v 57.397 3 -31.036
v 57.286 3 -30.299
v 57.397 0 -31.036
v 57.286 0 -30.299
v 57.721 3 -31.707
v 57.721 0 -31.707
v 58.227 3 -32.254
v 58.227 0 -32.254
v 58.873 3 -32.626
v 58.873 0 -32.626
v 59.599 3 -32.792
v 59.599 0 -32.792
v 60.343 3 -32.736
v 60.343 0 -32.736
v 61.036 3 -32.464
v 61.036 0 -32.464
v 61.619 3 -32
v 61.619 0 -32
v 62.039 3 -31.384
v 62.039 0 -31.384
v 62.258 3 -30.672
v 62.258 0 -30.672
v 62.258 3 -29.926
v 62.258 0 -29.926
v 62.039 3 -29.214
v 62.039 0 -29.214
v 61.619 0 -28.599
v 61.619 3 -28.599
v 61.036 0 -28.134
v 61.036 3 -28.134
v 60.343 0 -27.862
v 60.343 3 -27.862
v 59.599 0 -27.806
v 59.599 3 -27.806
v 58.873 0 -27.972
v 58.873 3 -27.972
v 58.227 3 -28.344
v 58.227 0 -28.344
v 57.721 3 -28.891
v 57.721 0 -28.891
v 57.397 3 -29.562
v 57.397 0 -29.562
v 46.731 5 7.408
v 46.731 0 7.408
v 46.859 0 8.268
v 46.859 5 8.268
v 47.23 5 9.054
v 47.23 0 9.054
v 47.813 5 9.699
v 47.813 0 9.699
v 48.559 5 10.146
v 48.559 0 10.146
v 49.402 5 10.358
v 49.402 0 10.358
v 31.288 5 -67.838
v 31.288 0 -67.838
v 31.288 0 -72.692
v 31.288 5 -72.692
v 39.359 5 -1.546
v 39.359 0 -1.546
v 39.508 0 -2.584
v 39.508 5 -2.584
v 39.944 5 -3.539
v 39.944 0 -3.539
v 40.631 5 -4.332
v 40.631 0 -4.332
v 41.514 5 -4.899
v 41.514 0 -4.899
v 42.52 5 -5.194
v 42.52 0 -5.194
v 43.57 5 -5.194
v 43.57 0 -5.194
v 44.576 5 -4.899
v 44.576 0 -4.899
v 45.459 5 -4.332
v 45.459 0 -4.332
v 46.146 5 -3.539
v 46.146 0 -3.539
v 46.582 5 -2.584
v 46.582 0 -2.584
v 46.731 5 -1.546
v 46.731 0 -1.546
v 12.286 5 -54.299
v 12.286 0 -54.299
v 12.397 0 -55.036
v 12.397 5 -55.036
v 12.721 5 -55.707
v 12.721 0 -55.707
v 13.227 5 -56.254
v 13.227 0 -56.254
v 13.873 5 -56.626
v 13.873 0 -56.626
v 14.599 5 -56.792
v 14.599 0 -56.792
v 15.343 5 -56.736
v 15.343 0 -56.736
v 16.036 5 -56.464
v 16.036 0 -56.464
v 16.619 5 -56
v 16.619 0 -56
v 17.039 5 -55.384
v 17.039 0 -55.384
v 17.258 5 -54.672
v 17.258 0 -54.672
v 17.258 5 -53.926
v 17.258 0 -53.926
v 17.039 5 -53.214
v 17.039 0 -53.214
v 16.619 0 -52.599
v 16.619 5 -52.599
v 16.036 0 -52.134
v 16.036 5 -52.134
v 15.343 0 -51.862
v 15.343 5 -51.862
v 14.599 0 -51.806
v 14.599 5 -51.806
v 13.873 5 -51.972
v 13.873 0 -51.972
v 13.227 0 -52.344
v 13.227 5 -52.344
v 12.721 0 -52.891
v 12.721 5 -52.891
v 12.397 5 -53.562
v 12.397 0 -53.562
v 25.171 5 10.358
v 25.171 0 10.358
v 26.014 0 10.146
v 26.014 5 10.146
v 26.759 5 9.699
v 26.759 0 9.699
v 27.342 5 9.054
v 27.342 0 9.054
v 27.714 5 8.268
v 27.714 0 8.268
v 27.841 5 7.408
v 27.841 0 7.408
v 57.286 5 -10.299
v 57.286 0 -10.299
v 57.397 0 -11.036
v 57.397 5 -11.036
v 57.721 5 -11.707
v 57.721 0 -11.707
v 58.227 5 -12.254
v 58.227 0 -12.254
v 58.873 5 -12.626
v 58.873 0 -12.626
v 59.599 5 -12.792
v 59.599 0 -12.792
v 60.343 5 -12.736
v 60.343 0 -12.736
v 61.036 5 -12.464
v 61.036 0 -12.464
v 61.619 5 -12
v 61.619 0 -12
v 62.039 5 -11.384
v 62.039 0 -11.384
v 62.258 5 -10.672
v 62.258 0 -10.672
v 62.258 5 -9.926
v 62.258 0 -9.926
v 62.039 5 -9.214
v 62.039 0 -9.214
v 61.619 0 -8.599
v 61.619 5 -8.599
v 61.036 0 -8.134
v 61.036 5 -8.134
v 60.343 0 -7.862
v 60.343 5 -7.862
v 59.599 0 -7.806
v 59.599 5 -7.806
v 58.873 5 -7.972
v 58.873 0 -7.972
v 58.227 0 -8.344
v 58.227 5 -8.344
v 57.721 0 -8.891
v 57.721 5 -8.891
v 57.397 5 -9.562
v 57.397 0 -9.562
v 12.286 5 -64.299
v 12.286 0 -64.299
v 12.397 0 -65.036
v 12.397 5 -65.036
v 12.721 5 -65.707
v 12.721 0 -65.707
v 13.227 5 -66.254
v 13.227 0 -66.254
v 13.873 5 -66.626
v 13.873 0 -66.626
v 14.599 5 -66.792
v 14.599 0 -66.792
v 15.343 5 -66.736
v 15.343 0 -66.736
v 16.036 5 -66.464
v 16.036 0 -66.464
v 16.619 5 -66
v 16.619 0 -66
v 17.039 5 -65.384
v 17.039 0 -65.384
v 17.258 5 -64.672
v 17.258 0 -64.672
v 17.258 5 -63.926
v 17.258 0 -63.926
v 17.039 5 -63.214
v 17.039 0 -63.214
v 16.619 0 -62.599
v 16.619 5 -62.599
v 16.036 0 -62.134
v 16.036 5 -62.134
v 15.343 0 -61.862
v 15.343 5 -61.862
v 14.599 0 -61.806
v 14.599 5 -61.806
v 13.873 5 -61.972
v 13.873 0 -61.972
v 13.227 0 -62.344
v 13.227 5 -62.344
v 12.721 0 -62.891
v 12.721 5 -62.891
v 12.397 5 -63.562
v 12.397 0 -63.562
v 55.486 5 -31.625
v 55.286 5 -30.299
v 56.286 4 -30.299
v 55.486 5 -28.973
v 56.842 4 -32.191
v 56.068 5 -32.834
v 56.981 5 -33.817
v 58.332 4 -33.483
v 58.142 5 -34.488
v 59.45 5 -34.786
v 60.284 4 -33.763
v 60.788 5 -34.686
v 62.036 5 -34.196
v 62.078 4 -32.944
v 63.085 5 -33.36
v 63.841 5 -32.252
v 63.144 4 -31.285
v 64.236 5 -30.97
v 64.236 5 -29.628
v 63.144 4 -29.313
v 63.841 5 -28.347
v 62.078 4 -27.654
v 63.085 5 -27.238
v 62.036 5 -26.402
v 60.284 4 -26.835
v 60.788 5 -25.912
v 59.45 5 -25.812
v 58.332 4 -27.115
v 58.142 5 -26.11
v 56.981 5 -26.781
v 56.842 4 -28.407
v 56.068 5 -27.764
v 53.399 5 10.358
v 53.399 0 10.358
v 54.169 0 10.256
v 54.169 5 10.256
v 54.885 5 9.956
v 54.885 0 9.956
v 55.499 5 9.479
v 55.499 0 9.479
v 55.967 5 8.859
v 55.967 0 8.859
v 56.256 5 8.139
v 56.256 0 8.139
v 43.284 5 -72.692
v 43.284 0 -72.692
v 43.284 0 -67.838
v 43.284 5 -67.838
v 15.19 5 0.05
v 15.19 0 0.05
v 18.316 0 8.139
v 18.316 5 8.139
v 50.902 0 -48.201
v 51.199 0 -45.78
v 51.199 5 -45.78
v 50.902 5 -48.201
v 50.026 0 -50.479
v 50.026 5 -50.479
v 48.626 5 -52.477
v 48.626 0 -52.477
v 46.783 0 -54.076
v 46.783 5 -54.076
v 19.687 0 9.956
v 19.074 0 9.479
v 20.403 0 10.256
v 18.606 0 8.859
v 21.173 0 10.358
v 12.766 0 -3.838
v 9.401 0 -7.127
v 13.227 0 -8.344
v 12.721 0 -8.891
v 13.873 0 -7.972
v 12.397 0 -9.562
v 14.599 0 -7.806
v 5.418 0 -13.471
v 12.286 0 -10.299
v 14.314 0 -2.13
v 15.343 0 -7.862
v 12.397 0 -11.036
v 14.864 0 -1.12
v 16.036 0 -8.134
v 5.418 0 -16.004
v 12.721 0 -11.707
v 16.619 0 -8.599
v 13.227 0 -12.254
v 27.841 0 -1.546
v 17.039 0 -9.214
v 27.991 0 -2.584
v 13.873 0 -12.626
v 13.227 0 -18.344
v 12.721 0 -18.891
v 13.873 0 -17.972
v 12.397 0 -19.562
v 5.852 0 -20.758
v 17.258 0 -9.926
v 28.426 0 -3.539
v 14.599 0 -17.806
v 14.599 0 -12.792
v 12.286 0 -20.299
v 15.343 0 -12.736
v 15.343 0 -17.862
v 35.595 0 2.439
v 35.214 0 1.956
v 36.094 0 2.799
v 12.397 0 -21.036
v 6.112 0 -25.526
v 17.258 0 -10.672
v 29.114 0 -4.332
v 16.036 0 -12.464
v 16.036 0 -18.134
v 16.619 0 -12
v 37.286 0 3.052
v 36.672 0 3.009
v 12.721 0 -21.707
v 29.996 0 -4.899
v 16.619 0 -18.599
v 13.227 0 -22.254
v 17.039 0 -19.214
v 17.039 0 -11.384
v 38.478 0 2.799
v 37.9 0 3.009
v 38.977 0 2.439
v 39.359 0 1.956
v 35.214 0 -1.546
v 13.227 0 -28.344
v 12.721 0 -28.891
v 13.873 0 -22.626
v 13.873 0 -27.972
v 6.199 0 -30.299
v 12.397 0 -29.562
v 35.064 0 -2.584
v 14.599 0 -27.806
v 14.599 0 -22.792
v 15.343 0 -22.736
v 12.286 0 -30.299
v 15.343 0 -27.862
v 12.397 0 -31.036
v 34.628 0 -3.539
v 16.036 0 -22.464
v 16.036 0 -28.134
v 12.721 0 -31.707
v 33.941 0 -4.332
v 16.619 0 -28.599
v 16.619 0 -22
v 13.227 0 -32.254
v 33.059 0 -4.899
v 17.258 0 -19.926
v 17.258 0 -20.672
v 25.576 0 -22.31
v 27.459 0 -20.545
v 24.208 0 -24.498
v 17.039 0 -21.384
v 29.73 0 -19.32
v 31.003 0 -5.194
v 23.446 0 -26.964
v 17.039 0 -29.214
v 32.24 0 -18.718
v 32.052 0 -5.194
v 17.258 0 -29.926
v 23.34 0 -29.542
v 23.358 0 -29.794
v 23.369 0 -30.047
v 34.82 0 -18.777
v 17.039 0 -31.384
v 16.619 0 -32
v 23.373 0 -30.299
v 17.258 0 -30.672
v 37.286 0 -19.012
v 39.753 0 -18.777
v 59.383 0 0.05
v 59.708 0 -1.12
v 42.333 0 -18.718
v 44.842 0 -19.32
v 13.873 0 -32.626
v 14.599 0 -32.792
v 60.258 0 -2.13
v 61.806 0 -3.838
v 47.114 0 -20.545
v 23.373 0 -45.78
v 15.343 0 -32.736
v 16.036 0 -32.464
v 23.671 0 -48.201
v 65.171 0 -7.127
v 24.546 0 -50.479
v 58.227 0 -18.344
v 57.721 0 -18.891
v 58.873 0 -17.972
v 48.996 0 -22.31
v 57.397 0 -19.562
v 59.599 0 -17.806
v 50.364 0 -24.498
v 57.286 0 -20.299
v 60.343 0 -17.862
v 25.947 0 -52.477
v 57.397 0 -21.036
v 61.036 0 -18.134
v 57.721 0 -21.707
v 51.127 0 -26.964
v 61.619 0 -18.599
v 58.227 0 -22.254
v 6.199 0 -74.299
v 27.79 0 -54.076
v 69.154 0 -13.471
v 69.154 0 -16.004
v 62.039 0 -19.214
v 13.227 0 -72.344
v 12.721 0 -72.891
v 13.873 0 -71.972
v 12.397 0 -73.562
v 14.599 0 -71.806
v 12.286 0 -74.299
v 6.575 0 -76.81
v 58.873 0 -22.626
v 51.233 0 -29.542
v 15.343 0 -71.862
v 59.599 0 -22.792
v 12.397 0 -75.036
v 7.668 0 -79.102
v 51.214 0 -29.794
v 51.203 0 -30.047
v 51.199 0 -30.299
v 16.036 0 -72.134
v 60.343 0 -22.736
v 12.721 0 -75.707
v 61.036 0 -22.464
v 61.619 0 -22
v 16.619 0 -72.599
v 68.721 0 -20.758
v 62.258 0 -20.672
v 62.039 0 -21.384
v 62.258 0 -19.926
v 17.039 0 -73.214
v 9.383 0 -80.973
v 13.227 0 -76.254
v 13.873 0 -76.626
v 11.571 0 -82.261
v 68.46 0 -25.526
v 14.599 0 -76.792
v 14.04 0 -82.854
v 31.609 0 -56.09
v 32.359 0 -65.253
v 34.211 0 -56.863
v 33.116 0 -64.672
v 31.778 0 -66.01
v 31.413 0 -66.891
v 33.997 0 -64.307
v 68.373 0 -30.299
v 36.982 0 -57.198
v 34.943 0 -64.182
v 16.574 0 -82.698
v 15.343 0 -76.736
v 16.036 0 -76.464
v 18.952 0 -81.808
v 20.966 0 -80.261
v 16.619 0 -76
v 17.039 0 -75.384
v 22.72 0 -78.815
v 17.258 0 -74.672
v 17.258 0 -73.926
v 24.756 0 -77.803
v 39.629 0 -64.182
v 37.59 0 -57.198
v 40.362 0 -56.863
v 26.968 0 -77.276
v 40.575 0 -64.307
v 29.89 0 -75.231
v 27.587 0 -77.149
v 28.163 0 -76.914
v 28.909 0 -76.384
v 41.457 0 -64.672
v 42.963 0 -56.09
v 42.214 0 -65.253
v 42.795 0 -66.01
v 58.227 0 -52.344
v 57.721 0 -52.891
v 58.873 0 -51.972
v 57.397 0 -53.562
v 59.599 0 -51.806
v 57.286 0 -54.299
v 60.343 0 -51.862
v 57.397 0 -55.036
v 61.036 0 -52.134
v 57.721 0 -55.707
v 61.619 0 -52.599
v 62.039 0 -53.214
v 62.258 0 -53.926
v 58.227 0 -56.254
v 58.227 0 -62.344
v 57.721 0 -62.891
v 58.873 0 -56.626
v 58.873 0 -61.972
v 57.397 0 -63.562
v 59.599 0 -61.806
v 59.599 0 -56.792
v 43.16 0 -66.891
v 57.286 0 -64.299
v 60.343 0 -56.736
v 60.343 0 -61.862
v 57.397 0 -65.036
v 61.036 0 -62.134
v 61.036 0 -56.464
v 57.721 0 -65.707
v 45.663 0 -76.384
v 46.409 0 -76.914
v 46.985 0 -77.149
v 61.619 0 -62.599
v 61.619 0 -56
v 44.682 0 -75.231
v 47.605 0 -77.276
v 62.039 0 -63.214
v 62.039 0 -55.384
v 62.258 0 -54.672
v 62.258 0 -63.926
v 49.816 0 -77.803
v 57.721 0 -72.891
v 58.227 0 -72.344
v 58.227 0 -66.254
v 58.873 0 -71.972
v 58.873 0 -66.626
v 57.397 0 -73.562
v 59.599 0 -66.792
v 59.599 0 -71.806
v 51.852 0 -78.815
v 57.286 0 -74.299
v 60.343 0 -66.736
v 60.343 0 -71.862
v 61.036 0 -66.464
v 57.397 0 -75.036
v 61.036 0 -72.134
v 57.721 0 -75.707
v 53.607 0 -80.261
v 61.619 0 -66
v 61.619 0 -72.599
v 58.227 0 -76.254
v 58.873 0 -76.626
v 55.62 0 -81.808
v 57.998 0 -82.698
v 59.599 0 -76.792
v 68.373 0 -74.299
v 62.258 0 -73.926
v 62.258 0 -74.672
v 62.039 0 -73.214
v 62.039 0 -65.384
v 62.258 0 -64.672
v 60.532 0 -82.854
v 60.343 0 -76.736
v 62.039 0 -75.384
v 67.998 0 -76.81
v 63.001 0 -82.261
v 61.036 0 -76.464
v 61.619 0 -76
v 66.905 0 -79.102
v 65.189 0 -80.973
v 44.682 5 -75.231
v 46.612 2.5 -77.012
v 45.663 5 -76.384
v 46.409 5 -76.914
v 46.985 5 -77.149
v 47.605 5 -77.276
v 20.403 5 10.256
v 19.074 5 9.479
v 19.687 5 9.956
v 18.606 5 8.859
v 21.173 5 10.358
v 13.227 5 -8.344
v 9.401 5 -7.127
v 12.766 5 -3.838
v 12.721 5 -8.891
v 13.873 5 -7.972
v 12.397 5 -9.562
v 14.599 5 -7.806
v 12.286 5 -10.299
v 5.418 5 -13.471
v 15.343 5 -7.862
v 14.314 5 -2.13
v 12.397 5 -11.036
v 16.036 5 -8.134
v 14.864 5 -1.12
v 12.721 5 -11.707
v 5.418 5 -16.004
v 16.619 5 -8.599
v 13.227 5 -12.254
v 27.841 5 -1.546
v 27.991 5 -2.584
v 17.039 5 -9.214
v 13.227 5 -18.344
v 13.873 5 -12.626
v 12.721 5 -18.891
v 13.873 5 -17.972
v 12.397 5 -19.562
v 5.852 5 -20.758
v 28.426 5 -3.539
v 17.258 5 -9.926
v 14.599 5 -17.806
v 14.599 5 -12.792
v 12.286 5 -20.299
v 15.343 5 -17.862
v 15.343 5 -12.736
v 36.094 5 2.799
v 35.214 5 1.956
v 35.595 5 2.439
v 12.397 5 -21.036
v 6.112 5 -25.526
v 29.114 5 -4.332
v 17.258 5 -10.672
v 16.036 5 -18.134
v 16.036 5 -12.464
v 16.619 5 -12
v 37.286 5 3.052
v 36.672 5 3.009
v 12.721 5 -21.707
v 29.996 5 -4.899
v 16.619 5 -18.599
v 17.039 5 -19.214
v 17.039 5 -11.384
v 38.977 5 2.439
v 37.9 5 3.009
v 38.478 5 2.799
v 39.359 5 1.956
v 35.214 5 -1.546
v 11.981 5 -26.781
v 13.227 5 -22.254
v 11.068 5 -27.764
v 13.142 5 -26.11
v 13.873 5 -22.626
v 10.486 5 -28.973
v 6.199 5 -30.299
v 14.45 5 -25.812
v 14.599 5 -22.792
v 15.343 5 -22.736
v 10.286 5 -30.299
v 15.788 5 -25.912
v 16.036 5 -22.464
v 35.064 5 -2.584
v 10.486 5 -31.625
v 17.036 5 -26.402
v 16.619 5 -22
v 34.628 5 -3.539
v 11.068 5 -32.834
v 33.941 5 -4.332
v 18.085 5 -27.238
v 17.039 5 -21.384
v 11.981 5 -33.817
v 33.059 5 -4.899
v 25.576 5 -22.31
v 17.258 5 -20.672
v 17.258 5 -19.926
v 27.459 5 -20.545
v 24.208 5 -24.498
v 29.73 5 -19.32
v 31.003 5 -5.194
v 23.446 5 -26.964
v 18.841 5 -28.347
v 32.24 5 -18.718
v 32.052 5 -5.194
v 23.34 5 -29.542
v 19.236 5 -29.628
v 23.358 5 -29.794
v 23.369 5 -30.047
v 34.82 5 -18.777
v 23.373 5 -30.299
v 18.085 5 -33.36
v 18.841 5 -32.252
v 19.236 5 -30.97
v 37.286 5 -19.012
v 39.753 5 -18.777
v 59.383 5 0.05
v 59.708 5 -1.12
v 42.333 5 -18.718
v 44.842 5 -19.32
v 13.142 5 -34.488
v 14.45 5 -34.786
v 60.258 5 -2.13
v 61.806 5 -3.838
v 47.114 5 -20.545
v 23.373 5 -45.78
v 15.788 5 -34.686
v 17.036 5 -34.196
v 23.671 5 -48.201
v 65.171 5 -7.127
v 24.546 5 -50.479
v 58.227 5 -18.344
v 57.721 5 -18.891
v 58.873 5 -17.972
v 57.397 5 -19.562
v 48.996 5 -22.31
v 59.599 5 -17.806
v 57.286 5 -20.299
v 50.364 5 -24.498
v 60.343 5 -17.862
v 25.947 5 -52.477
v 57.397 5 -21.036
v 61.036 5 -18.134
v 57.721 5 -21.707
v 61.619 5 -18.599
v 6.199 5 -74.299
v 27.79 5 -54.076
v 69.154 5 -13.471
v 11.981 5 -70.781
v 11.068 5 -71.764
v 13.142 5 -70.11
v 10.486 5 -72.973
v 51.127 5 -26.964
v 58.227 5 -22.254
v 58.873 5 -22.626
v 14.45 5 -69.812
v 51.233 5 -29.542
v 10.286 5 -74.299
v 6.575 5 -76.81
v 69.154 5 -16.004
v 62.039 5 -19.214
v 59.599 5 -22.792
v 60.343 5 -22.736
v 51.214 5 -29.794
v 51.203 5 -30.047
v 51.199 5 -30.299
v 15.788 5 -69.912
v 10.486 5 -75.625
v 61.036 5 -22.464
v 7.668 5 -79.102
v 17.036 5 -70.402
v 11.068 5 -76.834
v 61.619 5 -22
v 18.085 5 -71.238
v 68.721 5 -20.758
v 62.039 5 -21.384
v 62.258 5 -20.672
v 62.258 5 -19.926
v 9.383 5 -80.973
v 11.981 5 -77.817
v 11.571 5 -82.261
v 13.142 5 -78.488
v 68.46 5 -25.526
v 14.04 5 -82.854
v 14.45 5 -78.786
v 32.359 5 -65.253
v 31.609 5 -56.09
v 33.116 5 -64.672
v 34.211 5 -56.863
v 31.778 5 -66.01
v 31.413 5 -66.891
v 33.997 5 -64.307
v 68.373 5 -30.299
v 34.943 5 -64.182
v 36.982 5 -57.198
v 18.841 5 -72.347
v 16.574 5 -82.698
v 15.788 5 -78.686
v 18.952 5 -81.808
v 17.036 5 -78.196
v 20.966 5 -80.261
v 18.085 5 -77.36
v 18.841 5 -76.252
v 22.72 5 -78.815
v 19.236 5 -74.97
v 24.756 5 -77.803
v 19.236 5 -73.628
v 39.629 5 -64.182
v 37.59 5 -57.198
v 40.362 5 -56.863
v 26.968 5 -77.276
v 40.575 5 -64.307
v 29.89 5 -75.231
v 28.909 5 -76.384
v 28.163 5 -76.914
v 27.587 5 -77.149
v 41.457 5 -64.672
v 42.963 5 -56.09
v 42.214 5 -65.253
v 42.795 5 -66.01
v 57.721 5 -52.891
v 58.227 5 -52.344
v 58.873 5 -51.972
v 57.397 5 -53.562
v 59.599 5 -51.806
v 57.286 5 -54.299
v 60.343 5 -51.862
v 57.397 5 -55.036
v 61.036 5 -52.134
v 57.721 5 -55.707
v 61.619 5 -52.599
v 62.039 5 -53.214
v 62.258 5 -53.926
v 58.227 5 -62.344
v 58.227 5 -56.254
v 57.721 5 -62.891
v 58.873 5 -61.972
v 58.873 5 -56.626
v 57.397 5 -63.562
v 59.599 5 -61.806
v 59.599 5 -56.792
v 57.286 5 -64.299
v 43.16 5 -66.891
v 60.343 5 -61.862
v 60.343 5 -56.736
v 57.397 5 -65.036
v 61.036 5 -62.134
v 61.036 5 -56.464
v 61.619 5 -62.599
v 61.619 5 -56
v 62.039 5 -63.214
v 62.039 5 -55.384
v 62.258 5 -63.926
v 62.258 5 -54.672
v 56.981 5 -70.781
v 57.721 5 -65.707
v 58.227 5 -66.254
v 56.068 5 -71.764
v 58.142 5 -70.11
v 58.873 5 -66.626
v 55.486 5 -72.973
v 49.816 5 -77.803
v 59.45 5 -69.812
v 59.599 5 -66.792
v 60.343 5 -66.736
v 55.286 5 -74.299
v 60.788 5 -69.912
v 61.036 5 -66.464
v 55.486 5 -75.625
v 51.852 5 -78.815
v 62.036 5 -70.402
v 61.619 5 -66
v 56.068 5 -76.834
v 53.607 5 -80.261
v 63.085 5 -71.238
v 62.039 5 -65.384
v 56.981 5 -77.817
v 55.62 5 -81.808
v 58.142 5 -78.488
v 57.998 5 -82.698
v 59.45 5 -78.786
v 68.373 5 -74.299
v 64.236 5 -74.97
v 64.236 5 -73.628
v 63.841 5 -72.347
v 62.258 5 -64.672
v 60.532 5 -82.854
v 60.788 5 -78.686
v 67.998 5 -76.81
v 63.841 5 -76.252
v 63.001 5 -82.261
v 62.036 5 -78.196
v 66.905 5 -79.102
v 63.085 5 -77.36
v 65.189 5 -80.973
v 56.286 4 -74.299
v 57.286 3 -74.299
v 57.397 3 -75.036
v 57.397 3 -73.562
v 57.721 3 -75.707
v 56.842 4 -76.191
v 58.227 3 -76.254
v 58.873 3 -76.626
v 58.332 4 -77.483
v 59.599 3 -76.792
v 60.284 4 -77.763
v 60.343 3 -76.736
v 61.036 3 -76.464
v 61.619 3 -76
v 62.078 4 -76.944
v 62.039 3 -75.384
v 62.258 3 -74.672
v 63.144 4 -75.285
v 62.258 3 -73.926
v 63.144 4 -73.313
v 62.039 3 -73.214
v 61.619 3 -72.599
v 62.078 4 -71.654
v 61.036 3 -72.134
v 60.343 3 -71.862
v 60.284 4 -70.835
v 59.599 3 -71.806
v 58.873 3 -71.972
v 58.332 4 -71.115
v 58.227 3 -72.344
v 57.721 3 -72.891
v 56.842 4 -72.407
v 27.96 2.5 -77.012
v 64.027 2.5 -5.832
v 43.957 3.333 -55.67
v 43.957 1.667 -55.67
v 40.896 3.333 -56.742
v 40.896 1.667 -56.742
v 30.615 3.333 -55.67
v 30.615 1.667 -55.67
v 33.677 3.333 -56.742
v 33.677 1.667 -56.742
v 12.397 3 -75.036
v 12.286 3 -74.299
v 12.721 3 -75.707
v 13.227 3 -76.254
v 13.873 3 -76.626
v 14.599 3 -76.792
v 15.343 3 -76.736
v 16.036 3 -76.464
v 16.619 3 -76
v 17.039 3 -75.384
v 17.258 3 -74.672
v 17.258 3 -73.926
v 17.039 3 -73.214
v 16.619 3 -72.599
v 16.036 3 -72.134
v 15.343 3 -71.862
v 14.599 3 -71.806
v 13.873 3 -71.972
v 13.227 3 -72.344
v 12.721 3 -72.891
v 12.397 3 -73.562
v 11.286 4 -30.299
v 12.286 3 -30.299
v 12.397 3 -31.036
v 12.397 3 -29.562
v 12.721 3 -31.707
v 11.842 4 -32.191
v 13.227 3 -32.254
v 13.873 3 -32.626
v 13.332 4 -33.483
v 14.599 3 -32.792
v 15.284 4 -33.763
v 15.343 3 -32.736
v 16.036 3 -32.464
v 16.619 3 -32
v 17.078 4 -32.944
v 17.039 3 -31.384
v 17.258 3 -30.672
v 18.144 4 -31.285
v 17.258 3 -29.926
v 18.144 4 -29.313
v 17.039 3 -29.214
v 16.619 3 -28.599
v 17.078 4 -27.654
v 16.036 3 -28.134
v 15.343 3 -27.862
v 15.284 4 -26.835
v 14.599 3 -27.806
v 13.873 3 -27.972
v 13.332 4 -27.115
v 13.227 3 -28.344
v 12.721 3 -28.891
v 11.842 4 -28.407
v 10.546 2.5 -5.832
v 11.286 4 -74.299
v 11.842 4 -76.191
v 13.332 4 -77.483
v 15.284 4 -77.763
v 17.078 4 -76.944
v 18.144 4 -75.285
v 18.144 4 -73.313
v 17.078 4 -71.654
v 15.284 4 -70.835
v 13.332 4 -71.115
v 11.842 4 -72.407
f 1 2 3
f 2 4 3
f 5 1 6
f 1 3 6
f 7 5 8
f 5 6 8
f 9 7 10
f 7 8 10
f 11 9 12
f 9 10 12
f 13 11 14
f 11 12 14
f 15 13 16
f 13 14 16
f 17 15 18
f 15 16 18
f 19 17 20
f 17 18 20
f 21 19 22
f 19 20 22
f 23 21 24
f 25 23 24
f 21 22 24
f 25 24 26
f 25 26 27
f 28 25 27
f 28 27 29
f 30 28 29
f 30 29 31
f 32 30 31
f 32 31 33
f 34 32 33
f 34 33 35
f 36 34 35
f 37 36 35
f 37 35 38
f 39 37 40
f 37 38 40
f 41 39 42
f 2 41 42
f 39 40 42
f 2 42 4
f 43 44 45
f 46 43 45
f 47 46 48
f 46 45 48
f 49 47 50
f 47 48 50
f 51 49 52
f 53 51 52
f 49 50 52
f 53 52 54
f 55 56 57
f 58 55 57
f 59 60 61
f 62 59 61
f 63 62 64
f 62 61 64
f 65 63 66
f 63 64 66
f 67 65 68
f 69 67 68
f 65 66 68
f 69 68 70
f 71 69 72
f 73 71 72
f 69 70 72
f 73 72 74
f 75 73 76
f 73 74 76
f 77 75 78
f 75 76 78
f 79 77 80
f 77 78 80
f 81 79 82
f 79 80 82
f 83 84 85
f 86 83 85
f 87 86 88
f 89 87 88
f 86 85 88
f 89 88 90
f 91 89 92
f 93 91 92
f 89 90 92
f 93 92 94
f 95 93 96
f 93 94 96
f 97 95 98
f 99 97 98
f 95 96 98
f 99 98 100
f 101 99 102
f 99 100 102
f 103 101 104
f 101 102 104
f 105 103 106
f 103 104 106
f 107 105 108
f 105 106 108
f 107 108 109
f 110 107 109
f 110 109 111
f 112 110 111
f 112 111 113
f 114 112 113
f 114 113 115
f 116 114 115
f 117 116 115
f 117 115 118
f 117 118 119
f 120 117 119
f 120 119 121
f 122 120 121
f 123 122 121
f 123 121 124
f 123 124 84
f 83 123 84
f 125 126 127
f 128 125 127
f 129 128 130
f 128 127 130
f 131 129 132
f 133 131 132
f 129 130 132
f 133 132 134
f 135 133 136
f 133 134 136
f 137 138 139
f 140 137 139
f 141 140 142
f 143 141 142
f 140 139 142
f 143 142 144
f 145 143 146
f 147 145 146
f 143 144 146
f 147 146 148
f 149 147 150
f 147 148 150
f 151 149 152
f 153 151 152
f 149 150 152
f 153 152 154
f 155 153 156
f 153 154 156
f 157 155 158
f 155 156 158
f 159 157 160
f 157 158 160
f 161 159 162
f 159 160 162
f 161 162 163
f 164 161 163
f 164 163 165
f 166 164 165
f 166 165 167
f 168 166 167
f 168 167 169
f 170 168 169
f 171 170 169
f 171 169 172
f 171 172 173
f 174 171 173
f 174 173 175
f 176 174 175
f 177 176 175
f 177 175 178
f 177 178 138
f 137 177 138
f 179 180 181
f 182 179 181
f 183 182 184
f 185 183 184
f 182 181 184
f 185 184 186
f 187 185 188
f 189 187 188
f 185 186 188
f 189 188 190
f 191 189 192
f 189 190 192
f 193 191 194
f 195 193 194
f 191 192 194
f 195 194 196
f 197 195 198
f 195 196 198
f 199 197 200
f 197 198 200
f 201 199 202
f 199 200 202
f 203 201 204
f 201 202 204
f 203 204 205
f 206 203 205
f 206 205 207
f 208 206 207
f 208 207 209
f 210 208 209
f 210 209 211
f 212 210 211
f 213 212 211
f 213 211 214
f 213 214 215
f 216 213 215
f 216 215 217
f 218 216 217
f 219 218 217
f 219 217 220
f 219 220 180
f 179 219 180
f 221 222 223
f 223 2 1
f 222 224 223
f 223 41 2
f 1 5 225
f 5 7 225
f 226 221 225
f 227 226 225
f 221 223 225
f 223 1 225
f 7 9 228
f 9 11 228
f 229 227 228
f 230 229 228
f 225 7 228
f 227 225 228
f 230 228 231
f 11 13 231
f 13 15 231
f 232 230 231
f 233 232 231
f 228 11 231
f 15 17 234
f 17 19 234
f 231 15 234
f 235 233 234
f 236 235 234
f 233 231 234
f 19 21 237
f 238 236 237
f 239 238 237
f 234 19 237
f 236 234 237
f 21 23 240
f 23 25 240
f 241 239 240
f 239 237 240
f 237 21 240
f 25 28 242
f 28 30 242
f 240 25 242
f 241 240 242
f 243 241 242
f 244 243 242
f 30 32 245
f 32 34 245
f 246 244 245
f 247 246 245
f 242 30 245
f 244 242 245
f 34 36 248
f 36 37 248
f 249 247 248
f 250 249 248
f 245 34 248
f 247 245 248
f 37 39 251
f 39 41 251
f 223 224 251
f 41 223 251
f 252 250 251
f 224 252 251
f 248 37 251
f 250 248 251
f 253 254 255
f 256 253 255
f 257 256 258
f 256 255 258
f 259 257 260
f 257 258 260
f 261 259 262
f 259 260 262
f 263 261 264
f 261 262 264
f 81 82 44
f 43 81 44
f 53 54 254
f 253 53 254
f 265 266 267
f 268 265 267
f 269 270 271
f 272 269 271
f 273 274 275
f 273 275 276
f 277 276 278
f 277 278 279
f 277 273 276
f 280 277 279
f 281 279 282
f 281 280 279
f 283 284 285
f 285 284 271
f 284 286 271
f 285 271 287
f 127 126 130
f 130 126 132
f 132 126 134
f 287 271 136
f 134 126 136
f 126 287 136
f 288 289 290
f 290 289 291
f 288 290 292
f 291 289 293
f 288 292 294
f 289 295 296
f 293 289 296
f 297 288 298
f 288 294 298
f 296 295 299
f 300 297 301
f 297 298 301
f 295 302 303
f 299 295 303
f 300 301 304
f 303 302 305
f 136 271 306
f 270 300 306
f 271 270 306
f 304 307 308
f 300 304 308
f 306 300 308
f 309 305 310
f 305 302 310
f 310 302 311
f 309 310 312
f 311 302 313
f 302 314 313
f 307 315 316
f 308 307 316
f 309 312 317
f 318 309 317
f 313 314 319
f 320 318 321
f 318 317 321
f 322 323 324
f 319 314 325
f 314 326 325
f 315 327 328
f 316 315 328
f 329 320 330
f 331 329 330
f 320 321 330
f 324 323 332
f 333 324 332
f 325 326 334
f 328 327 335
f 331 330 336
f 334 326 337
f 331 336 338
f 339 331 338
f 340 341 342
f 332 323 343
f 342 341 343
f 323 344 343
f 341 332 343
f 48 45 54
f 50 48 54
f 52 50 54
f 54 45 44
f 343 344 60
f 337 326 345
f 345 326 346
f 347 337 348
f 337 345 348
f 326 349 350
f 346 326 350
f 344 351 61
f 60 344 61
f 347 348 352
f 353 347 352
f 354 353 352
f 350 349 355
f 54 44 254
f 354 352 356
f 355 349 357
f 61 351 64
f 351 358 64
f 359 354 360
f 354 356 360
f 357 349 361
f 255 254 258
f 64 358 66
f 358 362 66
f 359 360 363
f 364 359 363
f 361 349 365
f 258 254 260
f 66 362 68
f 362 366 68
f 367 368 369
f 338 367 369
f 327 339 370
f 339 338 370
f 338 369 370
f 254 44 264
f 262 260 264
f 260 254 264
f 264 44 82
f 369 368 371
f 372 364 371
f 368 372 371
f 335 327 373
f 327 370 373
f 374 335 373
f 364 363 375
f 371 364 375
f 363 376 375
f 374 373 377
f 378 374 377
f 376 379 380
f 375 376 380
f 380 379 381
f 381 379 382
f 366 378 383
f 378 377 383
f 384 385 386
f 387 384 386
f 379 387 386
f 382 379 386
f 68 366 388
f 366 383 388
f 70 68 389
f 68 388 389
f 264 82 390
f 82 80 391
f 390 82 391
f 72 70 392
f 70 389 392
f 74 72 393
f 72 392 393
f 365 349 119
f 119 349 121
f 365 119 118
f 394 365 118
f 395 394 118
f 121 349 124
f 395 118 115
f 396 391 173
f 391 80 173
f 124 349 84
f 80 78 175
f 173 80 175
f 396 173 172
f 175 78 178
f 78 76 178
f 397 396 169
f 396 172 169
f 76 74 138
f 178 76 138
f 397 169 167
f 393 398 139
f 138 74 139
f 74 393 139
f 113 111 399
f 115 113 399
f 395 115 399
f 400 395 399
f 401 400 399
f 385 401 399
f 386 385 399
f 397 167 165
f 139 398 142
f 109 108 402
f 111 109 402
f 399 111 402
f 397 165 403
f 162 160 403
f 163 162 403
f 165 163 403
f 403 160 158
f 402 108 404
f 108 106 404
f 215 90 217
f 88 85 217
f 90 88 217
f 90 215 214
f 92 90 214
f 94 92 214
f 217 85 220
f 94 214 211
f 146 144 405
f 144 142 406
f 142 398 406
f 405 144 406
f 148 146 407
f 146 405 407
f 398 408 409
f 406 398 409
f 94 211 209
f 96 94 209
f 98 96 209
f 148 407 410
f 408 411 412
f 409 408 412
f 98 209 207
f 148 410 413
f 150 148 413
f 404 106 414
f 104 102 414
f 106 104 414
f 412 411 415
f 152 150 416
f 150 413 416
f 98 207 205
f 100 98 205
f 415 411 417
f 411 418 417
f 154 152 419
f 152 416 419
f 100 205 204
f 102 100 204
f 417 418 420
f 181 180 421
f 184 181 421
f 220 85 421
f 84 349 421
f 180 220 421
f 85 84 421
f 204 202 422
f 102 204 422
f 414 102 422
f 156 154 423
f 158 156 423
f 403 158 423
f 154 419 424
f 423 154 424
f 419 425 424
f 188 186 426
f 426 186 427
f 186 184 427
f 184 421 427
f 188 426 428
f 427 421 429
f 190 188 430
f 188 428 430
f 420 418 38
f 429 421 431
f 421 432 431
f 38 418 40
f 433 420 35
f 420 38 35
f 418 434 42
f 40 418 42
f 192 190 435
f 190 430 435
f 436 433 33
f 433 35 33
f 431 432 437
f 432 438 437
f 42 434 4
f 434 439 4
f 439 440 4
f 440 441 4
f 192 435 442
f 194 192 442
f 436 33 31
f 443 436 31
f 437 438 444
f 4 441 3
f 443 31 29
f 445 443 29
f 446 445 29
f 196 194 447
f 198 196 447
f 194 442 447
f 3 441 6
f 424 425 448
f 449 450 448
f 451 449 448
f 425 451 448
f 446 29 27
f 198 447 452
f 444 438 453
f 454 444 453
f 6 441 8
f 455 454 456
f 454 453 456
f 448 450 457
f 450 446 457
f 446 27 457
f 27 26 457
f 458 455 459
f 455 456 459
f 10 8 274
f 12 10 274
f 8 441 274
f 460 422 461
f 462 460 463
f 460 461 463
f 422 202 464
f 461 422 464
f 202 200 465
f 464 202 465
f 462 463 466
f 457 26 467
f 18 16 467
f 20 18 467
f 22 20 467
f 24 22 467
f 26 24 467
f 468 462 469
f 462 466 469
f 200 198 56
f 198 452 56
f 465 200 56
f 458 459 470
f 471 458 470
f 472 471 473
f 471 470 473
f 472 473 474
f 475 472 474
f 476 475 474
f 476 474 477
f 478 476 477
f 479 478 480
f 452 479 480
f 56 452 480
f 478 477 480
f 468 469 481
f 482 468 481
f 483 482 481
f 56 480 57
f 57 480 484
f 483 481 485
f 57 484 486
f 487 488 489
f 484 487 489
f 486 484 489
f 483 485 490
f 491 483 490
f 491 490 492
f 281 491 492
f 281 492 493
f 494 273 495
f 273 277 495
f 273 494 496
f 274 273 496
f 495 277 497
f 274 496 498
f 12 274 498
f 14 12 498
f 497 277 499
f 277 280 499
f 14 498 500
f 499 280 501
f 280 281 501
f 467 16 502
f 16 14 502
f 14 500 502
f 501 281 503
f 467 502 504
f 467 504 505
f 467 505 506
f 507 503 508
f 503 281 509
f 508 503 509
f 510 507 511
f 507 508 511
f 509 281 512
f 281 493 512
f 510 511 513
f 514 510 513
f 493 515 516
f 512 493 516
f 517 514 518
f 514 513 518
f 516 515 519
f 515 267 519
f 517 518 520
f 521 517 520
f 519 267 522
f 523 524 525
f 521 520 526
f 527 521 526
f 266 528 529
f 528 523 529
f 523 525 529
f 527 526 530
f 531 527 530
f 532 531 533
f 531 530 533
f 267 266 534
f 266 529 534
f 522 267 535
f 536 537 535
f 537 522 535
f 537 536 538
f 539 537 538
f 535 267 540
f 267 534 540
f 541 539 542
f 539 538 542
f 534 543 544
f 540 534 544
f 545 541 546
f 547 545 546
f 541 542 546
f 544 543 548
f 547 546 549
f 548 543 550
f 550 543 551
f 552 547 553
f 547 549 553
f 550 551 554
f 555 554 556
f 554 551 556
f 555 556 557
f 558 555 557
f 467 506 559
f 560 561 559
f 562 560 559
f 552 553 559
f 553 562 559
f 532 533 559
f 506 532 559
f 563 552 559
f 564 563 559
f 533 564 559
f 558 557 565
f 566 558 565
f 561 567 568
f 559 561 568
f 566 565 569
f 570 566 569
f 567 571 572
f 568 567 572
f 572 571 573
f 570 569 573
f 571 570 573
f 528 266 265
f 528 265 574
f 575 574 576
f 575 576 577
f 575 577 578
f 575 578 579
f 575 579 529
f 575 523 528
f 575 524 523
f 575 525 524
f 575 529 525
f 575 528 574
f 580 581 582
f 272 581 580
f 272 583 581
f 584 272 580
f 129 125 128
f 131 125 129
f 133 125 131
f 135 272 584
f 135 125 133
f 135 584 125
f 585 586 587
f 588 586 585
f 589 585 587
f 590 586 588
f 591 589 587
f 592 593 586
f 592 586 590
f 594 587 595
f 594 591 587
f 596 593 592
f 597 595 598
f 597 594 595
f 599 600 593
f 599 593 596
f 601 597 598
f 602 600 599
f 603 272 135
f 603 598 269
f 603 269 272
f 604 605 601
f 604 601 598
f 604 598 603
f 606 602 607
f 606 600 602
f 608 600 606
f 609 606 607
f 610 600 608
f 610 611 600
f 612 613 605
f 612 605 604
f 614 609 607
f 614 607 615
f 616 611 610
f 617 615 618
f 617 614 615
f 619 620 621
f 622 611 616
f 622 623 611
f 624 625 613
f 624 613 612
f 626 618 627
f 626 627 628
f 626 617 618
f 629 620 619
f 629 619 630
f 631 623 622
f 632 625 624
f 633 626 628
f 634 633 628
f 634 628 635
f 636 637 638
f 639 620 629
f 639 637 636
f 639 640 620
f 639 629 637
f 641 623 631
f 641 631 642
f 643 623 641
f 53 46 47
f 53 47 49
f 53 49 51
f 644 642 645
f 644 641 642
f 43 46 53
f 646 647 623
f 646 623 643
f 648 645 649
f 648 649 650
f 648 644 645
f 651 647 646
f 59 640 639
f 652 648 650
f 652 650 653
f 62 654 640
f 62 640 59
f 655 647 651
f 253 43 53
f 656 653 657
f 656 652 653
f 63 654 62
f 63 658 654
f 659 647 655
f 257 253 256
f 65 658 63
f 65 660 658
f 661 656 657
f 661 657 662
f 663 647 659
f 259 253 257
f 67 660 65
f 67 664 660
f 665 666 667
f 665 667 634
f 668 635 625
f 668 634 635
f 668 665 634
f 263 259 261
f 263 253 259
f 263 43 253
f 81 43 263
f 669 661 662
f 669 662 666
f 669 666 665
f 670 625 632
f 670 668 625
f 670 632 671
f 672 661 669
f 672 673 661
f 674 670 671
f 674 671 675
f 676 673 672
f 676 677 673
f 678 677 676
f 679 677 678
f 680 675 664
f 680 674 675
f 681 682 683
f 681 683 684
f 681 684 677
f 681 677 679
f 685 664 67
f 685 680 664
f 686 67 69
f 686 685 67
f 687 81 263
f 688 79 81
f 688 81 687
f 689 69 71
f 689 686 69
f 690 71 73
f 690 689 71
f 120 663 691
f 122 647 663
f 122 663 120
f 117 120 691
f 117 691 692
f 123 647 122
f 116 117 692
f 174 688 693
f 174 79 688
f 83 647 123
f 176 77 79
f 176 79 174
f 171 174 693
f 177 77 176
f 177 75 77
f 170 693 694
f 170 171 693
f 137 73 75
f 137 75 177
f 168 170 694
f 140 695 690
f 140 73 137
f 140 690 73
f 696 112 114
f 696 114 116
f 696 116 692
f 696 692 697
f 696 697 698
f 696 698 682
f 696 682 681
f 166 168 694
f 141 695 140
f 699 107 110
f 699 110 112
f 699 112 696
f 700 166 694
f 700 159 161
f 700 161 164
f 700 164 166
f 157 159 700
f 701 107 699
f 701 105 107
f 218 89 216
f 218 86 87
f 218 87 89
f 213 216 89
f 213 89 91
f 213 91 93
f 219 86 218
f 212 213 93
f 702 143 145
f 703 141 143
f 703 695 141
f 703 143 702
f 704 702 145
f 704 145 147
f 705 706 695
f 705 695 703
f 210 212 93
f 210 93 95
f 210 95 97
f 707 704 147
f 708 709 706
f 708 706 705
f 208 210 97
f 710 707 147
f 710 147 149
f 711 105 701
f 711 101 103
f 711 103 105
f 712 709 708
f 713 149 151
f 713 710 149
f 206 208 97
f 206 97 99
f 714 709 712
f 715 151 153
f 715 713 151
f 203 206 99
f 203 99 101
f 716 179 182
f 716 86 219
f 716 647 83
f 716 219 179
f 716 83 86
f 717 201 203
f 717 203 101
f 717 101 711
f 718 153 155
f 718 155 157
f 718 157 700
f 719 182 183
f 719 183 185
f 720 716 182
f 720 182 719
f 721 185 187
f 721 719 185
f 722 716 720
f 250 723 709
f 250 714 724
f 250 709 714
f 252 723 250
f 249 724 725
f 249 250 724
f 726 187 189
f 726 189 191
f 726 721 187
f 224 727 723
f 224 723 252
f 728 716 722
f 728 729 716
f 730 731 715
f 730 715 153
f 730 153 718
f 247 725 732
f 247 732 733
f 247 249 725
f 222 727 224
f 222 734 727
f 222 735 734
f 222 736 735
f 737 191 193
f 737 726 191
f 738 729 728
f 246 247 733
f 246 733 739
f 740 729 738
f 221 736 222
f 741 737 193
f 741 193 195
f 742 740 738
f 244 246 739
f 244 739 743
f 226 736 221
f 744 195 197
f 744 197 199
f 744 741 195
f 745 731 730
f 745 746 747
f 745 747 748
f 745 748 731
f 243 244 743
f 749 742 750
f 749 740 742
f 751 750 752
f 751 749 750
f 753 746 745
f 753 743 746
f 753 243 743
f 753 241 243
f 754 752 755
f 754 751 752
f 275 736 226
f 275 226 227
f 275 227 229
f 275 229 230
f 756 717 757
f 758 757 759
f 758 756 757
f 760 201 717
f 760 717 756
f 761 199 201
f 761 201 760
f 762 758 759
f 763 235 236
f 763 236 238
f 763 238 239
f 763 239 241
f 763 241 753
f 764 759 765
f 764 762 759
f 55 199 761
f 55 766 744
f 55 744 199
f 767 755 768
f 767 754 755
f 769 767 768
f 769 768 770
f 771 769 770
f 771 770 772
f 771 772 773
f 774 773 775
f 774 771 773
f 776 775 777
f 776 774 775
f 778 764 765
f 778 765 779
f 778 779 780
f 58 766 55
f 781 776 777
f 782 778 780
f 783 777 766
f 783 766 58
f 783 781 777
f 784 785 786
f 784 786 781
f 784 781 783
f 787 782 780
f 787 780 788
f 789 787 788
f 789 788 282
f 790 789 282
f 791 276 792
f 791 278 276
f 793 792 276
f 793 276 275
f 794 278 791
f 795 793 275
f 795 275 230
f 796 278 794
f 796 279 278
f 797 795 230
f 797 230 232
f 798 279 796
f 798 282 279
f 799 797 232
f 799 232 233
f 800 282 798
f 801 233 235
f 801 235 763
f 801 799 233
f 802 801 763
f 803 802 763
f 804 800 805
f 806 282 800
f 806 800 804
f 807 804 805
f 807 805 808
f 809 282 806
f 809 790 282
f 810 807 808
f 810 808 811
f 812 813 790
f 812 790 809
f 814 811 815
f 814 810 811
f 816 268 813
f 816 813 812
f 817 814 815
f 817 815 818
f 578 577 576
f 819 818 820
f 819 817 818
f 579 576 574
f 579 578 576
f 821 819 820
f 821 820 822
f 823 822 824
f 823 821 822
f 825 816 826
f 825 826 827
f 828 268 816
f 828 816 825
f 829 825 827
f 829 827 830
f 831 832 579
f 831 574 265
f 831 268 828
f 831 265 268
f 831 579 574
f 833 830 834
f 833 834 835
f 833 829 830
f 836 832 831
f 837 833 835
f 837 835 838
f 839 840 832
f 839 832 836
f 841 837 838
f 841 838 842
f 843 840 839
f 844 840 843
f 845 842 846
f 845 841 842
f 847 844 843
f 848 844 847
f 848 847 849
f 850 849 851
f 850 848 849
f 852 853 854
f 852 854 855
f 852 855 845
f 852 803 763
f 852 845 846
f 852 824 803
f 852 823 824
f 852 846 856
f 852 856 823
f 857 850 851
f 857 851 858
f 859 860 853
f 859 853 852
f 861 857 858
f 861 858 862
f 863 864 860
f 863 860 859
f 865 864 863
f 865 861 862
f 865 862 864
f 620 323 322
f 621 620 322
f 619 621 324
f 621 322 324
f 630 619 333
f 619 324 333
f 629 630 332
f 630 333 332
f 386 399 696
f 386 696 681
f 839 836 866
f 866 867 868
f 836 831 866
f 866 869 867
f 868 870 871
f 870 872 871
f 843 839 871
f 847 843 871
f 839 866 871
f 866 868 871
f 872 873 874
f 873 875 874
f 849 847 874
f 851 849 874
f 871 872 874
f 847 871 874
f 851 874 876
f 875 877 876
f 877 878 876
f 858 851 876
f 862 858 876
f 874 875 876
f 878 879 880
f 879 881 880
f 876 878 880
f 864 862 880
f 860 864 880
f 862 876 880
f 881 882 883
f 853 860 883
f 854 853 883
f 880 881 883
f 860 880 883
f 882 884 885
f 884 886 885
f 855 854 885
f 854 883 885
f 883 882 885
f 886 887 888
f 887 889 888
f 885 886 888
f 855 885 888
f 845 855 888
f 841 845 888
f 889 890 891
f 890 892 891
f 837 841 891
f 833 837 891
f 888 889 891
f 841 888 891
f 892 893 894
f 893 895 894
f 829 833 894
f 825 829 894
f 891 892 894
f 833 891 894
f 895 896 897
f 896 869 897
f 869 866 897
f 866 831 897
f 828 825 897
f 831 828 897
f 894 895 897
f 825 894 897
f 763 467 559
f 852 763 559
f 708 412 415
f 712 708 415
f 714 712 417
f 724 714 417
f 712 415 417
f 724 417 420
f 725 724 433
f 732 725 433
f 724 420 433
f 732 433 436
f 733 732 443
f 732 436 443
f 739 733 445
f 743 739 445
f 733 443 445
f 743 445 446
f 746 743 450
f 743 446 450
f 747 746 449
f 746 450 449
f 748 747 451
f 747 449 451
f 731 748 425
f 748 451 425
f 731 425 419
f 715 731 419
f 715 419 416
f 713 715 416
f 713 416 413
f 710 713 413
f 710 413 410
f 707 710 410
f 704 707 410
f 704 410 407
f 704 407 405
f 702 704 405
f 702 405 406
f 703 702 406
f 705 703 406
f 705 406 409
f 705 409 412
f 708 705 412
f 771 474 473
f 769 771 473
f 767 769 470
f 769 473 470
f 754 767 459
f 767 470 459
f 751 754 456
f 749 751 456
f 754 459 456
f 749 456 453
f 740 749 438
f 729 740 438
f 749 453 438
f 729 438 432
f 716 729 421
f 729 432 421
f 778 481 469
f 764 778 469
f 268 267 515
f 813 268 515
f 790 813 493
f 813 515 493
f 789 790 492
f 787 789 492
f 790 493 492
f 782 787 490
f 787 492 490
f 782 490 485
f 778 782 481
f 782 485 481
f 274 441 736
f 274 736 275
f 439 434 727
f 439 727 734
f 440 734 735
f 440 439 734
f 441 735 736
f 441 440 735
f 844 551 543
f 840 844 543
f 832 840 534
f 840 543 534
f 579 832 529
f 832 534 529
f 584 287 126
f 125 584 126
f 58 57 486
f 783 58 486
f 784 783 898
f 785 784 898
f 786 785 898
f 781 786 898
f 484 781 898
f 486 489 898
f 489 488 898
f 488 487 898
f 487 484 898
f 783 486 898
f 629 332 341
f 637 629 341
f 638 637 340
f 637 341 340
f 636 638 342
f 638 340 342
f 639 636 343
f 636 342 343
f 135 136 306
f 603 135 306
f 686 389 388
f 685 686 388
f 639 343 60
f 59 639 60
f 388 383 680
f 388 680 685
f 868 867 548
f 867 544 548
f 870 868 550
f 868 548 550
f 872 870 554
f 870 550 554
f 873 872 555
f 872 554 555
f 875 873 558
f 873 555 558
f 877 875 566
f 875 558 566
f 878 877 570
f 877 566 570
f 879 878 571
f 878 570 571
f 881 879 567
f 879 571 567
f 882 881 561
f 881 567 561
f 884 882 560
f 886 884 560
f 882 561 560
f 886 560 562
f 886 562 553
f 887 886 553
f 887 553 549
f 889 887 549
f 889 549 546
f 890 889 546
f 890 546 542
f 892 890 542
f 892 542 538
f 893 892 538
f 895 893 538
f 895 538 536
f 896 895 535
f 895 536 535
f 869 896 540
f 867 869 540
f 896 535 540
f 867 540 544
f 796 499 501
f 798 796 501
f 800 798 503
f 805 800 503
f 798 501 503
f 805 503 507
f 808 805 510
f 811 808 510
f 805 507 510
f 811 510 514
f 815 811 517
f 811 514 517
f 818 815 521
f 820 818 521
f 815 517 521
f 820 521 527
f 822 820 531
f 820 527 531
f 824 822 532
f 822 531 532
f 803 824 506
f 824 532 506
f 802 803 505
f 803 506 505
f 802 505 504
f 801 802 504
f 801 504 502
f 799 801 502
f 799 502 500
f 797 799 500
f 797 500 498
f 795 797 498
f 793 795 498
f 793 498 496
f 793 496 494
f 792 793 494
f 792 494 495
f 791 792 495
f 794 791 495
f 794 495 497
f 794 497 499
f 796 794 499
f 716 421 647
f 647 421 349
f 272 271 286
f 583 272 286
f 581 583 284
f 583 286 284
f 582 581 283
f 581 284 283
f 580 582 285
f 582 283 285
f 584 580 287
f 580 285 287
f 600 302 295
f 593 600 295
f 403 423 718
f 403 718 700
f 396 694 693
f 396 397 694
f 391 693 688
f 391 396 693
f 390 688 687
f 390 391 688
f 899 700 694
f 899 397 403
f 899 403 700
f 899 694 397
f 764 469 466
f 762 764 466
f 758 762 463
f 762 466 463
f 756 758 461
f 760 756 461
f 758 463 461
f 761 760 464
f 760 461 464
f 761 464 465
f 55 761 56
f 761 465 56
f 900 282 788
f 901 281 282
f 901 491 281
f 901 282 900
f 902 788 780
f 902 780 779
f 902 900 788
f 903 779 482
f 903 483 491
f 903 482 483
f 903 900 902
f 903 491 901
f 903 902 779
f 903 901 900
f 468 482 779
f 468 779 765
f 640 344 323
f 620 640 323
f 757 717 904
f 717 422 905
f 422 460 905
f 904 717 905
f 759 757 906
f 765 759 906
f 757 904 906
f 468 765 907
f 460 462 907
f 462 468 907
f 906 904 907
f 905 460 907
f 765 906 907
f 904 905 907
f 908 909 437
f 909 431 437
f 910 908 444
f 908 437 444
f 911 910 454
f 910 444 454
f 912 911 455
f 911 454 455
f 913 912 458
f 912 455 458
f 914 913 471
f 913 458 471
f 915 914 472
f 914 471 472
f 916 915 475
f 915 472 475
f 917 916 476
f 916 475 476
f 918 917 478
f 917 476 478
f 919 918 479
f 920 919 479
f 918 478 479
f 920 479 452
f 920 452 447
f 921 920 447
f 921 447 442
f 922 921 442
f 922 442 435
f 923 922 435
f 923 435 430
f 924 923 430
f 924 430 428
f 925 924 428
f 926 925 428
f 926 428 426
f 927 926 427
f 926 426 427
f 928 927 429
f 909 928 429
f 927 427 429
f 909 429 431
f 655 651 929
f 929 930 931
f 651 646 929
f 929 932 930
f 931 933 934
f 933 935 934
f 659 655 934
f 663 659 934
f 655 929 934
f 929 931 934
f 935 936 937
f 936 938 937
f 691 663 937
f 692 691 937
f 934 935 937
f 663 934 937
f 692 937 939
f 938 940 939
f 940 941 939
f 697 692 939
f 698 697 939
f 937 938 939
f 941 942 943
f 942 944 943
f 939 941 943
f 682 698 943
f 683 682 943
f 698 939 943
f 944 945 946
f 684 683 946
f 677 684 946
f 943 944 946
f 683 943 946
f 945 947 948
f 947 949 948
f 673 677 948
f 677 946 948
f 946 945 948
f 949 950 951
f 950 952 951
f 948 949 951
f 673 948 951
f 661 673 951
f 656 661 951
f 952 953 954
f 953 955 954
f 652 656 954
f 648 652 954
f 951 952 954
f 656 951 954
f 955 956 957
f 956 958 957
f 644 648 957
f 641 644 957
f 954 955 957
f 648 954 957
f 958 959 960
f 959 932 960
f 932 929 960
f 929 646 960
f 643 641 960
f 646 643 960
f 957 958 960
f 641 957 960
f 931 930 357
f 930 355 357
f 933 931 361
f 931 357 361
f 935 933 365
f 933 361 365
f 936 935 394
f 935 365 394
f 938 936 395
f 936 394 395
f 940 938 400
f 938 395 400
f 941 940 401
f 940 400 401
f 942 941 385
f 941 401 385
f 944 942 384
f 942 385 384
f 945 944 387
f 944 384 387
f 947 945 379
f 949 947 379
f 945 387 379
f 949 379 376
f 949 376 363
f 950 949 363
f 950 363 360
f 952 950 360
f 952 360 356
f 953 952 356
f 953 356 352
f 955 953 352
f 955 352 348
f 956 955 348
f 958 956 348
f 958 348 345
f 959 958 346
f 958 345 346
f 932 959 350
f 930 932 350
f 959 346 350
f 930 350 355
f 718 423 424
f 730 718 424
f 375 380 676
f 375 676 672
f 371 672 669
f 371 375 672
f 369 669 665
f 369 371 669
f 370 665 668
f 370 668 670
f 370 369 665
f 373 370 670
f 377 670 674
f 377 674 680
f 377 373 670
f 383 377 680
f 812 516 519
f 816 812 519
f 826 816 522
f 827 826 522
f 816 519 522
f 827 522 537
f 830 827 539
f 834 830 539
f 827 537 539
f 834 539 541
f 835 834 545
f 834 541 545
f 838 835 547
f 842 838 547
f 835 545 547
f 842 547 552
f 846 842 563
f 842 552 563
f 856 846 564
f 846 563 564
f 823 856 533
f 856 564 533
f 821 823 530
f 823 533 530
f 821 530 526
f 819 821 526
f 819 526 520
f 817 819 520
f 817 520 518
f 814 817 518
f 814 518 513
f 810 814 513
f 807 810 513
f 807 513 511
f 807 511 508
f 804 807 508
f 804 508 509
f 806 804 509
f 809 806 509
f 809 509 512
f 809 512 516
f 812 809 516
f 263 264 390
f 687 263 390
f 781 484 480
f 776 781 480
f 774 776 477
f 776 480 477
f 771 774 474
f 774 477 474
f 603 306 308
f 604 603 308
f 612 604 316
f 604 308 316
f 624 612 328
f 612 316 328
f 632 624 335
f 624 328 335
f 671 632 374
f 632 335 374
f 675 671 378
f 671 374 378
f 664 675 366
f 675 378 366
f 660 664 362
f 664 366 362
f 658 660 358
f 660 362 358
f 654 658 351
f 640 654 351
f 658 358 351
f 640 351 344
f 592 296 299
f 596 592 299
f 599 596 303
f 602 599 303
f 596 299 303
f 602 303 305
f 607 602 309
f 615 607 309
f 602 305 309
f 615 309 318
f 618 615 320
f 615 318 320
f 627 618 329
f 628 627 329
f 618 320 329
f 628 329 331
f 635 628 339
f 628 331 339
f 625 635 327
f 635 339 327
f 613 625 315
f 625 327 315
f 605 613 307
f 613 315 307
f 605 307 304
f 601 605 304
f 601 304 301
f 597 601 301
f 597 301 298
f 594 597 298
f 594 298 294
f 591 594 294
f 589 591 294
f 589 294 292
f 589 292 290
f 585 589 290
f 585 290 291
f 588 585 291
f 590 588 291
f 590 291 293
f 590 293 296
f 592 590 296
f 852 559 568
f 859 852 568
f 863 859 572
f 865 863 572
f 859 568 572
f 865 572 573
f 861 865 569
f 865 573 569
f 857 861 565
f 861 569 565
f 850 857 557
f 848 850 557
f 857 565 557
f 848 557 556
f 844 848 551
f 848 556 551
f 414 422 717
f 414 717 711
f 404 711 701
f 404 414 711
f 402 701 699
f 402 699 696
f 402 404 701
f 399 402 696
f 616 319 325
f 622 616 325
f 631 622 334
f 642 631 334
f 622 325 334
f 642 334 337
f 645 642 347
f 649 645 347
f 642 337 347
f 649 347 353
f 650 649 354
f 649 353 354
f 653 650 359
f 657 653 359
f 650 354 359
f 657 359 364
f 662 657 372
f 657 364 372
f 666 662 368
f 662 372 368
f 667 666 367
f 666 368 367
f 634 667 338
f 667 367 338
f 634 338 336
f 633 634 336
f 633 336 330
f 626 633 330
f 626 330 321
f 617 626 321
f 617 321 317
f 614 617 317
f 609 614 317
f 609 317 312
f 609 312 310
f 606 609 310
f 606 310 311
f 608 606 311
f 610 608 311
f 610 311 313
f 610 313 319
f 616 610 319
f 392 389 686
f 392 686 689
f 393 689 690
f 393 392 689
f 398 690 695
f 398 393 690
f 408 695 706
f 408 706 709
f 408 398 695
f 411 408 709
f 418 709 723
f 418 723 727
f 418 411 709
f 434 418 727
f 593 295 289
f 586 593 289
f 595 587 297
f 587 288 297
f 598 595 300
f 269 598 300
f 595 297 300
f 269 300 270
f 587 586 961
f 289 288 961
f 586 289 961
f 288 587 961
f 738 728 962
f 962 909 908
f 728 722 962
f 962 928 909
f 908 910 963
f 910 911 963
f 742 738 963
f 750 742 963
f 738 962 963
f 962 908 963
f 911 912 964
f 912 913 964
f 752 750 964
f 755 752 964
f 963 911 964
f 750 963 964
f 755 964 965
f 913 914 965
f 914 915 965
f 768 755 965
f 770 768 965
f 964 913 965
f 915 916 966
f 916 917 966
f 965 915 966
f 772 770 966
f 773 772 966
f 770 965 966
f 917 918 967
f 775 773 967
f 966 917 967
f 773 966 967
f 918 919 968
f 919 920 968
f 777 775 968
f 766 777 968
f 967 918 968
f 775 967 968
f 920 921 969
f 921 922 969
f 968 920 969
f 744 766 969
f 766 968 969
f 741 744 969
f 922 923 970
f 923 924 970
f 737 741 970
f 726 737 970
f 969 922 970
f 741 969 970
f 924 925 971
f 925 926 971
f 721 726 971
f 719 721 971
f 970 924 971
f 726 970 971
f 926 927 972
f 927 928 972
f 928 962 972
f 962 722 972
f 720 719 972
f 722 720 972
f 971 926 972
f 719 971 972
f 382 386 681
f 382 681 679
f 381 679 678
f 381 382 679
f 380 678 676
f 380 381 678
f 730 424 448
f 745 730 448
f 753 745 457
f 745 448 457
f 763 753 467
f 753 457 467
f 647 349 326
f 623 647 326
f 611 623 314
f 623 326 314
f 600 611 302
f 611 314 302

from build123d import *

# Parameters (mm, degrees)
BOSS_EXTRUDE1_DEPTH            = 5
M6_CLEARANCE_HOLE1_D           = 5
M6_CLEARANCE_HOLE1_CSINK_D     = 9
M6_CLEARANCE_HOLE1_CSINK_ANGLE = 90
M6X1_0_TAPPED_HOLE1_D          = 5


with BuildPart() as part:
    # Sketch1 → Boss-Extrude1 (new body)
    with BuildSketch(Plane(origin=(0, 0, 0), x_dir=(1, 0, 0), z_dir=(0, 1, 0))):
        with BuildLine():
            Line((69.154429566, 13.47085249), (69.154429566, 16.004009211))
            ThreePointArc((69.154429566, 16.004009211), (68.568623983, 23.140876552), (68.373161278, 30.2990773))
            Line((68.373161278, 30.2990773), (68.373161278, 48.133269951))
            Line((68.373161278, 48.133269951), (68.373161278, 53.582502285))
            Line((68.373161278, 53.582502285), (68.373161278, 74.2990773))
            ThreePointArc((68.373161278, 74.2990773), (63.00118115, 82.261470023), (53.60664117, 80.261348294))
            ThreePointArc((53.60664117, 80.261348294), (50.863204763, 78.250955414), (47.60463673, 77.276349225))
            add(Edge.make_bspline(
                [(43.284305461, 72.691623988), (43.987930263, 74.072264243), (45.137867804, 76.695348328), (47.258032118, 77.234650193), (47.60463673, 77.276349225)],
                knots=[0, 0, 0, 0, 0.393067042, 0.466810905, 0.466810905, 0.466810905, 0.466810905], degree=3))
            Line((43.284305461, 72.691623988), (43.284305461, 67.837570304))
            ThreePointArc((43.284305461, 67.837570304), (42.213675848, 65.252841772), (39.628947316, 64.182212159))
            Line((39.628947316, 64.182212159), (34.94347173, 64.182212159))
            ThreePointArc((34.94347173, 64.182212159), (32.358743198, 65.252841772), (31.288113585, 67.837570304))
            Line((31.288113585, 67.837570304), (31.288113585, 72.691623988))
            add(Edge.make_bspline(
                [(31.288113585, 72.691623988), (30.584488782, 74.072264242), (29.434551241, 76.695348328), (27.314386927, 77.234650193), (26.967782316, 77.276349225)],
                knots=[0, 0, 0, 0, 0.393067042, 0.466810905, 0.466810905, 0.466810905, 0.466810905], degree=3))
            ThreePointArc((26.967782316, 77.276349225), (23.709214283, 78.250955414), (20.965777876, 80.261348294))
            ThreePointArc((20.965777876, 80.261348294), (11.571237896, 82.261470023), (6.199257768, 74.2990773))
            Line((6.199257768, 74.2990773), (6.199257768, 53.582502285))
            Line((6.199257768, 53.582502285), (6.199257768, 48.133269951))
            Line((6.199257768, 48.133269951), (6.199257768, 30.2990773))
            ThreePointArc((6.199257768, 30.2990773), (6.003795063, 23.140876552), (5.41798948, 16.004009211))
            Line((5.41798948, 16.004009211), (5.41798948, 13.47085249))
            add(Edge.make_bspline(
                [(5.41798948, 13.47085249), (7.046412561, 10.903861817), (9.447890726, 5.623503132), (14.765538488, 2.695653096), (15.189698257, -0.049535855)],
                knots=[0, 0, 0, 0, 0.546916624, 1, 1, 1, 1], degree=3))
            Line((15.189698257, -0.049535855), (18.315949534, -8.138840351))
            ThreePointArc((18.315949534, -8.138840351), (19.364485683, -9.737903523), (21.173403671, -10.357779963))
            Line((21.173403671, -10.357779963), (25.170614374, -10.357779963))
            ThreePointArc((25.170614374, -10.357779963), (27.074415678, -9.397871639), (27.84130194, -7.408457441))
            Line((27.84130194, -7.408457441), (27.84130194, 1.545841867))
            ThreePointArc((27.84130194, 1.545841867), (31.527431336, 5.231971263), (35.213560733, 1.545841867))
            Line((35.213560733, 1.545841867), (35.213560733, -1.95624117))
            ThreePointArc((35.213560733, -1.95624117), (36.093993872, -2.799009437), (37.286209528, -3.05207602))
            ThreePointArc((37.286209528, -3.05207602), (38.478425184, -2.799009437), (39.358858323, -1.95624117))
            Line((39.358858323, -1.95624117), (39.358858323, 1.545841867))
            ThreePointArc((39.358858323, 1.545841867), (43.044987714, 5.231971258), (46.731117106, 1.545841867))
            Line((46.731117106, 1.545841867), (46.731117106, -7.408457441))
            ThreePointArc((46.731117106, -7.408457441), (47.498003369, -9.39787164), (49.401804673, -10.357779963))
            Line((49.401804673, -10.357779963), (53.399015375, -10.357779963))
            ThreePointArc((53.399015375, -10.357779963), (55.207933362, -9.737903523), (56.256469511, -8.138840351))
            Line((56.256469511, -8.138840351), (59.382720789, -0.049535855))
            add(Edge.make_bspline(
                [(69.154429566, 13.47085249), (67.526006485, 10.903861817), (65.12452832, 5.623503132), (59.806880557, 2.695653096), (59.382720789, -0.049535855)],
                knots=[0, 0, 0, 0, 0.546916624, 1, 1, 1, 1], degree=3))
        make_face()
        with BuildLine():
            Line((37.590365628, 57.198418754), (36.982053418, 57.198418754))
            add(Edge.make_bspline(
                [(27.789822398, 54.075777582), (30.499523282, 55.89941311), (33.552733603, 57.080263172), (36.982053418, 57.198418754)],
                knots=[0.681705089, 0.681705089, 0.681705089, 0.681705089, 1, 1, 1, 1], degree=3))
            ThreePointArc((27.789822398, 54.075777582), (24.546117922, 50.47890197), (23.373161278, 45.779614194))
            Line((23.373161278, 45.779614194), (23.373161278, 30.2990773))
            ThreePointArc((23.373161278, 30.2990773), (23.364804799, 29.920337919), (23.339751629, 29.542335687))
            ThreePointArc((23.339751629, 29.542335687), (26.460419501, 21.366644617), (34.819518268, 18.777057732))
            add(Edge.make_bspline(
                [(34.819518268, 18.777057732), (35.231027882, 18.840286024), (36.0539589, 18.949507928), (36.875794913, 19.003560622), (37.286209523, 19.011619704)],
                knots=[0.850973756, 0.850973756, 0.850973756, 0.850973756, 0.895462137, 0.939950518, 0.939950518, 0.939950518, 0.939950518], degree=3))
            add(Edge.make_bspline(
                [(39.752900778, 18.777057732), (39.341391163, 18.840286024), (38.518460146, 18.949507928), (37.696624133, 19.003560622), (37.286209523, 19.011619704)],
                knots=[0.850973756, 0.850973756, 0.850973756, 0.850973756, 0.895462137, 0.939950518, 0.939950518, 0.939950518, 0.939950518], degree=3))
            ThreePointArc((39.752900778, 18.777057732), (48.111999545, 21.366644617), (51.232667416, 29.542335687))
            ThreePointArc((51.232667416, 29.542335687), (51.207614246, 29.920337919), (51.199257768, 30.2990773))
            Line((51.199257768, 30.2990773), (51.199257768, 45.779614194))
            ThreePointArc((51.199257768, 45.779614194), (50.026301124, 50.47890197), (46.782596648, 54.075777582))
            add(Edge.make_bspline(
                [(46.782596648, 54.075777582), (44.072895763, 55.89941311), (41.019685443, 57.080263172), (37.590365628, 57.198418754)],
                knots=[0.681705089, 0.681705089, 0.681705089, 0.681705089, 1, 1, 1, 1], degree=3))
        make_face(mode=Mode.SUBTRACT)
    extrude(amount=BOSS_EXTRUDE1_DEPTH)

    # M6 Clearance Hole1 (through all)
    with Locations(Plane(origin=(0, 5, 0), x_dir=(1, 0, 0), z_dir=(0, 1, 0))):
        with Locations((14.786209523, 74.2990773), (59.786209523, 74.2990773), (14.786209523, 30.2990773), (59.786209523, 30.2990773)):
            CounterSinkHole(M6_CLEARANCE_HOLE1_D / 2, M6_CLEARANCE_HOLE1_CSINK_D / 2, counter_sink_angle=M6_CLEARANCE_HOLE1_CSINK_ANGLE)

    # M6x1.0 Tapped Hole1 (through all)
    with Locations(Plane(origin=(0, 5, 0), x_dir=(1, 0, 0), z_dir=(0, 1, 0))):
        with Locations((14.786209523, 54.2990773), (59.786209523, 54.2990773), (14.786209523, 10.2990773), (59.786209523, 10.2990773), (14.786209523, 64.2990773), (59.786209523, 64.2990773), (59.786209523, 20.2990773), (14.786209523, 20.2990773)):
            Hole(M6X1_0_TAPPED_HOLE1_D / 2)


solid = part.part
